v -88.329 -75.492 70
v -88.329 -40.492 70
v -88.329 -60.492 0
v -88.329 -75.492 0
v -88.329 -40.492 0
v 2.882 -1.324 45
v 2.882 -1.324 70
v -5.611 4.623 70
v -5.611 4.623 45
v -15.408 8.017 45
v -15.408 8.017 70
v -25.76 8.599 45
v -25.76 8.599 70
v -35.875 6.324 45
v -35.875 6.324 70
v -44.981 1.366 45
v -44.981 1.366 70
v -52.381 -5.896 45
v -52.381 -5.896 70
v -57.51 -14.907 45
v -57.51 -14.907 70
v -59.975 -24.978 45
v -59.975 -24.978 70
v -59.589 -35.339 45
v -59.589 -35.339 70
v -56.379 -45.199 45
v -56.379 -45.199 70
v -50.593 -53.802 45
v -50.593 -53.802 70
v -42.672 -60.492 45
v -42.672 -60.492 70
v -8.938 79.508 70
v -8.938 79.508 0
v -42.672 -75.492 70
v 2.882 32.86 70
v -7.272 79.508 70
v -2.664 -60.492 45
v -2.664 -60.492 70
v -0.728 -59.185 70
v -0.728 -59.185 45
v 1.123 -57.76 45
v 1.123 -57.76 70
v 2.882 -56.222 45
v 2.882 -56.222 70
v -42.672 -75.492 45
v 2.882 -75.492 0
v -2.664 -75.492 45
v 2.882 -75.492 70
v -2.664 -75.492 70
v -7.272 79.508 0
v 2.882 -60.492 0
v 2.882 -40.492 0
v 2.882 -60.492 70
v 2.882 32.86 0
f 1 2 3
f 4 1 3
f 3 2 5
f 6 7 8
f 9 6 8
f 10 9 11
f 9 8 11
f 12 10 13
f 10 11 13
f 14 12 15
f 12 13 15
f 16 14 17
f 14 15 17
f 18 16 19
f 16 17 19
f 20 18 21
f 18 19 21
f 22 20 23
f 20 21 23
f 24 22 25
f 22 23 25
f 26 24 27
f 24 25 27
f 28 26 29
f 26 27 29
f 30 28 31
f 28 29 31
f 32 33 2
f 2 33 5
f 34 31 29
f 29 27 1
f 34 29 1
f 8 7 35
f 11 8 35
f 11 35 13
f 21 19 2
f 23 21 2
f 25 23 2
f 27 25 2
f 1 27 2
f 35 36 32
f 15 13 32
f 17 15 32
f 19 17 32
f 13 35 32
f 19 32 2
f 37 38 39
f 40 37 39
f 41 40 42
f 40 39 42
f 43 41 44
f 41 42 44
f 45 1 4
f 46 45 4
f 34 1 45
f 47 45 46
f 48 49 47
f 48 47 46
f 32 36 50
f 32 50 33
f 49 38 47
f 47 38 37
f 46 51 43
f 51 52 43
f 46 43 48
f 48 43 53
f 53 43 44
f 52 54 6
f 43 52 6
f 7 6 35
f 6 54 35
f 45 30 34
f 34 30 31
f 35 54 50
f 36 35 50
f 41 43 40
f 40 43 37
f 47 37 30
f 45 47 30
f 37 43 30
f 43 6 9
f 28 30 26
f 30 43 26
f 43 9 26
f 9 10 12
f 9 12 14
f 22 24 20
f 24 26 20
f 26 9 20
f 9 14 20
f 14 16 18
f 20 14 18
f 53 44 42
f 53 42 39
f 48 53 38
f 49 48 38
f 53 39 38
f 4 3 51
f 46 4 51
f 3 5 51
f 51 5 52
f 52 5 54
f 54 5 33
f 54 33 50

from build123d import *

# Parameters (mm, degrees)
EXTRUDE_1_DEPTH     = 70
SKETCH_3_W          = 91.211474189
SKETCH_3_H          = 70
EXTRUDE_3_DEPTH     = 20
SKETCH_7_R          = 37.5
CUT_EXTRUDE_1_DEPTH = 25
EXTRUDE_5_DEPTH     = 15


with BuildPart() as part:
    # 草图1 → 凸台-拉伸1 (new body)
    with BuildSketch(Plane.XY):
        Polygon((-88.329382669, -40.492222209), (2.88209152, -40.492222209), (2.88209152, 32.860075705), (-7.271573344, 79.507777791), (-8.937829763, 79.507777791), align=None)
    extrude(amount=EXTRUDE_1_DEPTH)

    # 草图3 → 凸台-拉伸3 (add)
    with BuildSketch(Plane.XZ.offset(40.492222209)):
        with Locations((-42.723645575, 35)):
            Rectangle(SKETCH_3_W, SKETCH_3_H)
    extrude(amount=EXTRUDE_3_DEPTH)

    # 草图7 → 切除-拉伸1 (cut)
    with BuildSketch(Plane.XY.offset(70)):
        with Locations((-22.66790848, -28.773433698)):
            Circle(SKETCH_7_R)
    extrude(amount=-CUT_EXTRUDE_1_DEPTH, mode=Mode.SUBTRACT)

    # 草图10 → 凸台-拉伸5 (add)
    with BuildSketch(Plane.XZ.offset(60.492222209)):
        Polygon((-88.329382669, 70), (-88.329382669, 0), (2.88209152, 0), (2.88209152, 70), (-2.663697539, 70), (-2.663697539, 45), (-42.672119422, 45), (-42.672119422, 70), align=None)
    extrude(amount=EXTRUDE_5_DEPTH)


solid = part.part
